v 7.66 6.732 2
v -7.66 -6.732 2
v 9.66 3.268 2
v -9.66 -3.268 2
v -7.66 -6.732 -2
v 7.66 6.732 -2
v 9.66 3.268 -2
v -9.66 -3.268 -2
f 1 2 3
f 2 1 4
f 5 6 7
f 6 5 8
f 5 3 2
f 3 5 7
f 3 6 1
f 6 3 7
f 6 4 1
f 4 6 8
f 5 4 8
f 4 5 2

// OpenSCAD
// Rotate-convention check (plan §5). A long bar rotated about Z; mismatched Euler order/sign
// shows up immediately against the OpenSCAD reference render.
rotate([0, 0, 30]) cube([20, 4, 4], center = true);
